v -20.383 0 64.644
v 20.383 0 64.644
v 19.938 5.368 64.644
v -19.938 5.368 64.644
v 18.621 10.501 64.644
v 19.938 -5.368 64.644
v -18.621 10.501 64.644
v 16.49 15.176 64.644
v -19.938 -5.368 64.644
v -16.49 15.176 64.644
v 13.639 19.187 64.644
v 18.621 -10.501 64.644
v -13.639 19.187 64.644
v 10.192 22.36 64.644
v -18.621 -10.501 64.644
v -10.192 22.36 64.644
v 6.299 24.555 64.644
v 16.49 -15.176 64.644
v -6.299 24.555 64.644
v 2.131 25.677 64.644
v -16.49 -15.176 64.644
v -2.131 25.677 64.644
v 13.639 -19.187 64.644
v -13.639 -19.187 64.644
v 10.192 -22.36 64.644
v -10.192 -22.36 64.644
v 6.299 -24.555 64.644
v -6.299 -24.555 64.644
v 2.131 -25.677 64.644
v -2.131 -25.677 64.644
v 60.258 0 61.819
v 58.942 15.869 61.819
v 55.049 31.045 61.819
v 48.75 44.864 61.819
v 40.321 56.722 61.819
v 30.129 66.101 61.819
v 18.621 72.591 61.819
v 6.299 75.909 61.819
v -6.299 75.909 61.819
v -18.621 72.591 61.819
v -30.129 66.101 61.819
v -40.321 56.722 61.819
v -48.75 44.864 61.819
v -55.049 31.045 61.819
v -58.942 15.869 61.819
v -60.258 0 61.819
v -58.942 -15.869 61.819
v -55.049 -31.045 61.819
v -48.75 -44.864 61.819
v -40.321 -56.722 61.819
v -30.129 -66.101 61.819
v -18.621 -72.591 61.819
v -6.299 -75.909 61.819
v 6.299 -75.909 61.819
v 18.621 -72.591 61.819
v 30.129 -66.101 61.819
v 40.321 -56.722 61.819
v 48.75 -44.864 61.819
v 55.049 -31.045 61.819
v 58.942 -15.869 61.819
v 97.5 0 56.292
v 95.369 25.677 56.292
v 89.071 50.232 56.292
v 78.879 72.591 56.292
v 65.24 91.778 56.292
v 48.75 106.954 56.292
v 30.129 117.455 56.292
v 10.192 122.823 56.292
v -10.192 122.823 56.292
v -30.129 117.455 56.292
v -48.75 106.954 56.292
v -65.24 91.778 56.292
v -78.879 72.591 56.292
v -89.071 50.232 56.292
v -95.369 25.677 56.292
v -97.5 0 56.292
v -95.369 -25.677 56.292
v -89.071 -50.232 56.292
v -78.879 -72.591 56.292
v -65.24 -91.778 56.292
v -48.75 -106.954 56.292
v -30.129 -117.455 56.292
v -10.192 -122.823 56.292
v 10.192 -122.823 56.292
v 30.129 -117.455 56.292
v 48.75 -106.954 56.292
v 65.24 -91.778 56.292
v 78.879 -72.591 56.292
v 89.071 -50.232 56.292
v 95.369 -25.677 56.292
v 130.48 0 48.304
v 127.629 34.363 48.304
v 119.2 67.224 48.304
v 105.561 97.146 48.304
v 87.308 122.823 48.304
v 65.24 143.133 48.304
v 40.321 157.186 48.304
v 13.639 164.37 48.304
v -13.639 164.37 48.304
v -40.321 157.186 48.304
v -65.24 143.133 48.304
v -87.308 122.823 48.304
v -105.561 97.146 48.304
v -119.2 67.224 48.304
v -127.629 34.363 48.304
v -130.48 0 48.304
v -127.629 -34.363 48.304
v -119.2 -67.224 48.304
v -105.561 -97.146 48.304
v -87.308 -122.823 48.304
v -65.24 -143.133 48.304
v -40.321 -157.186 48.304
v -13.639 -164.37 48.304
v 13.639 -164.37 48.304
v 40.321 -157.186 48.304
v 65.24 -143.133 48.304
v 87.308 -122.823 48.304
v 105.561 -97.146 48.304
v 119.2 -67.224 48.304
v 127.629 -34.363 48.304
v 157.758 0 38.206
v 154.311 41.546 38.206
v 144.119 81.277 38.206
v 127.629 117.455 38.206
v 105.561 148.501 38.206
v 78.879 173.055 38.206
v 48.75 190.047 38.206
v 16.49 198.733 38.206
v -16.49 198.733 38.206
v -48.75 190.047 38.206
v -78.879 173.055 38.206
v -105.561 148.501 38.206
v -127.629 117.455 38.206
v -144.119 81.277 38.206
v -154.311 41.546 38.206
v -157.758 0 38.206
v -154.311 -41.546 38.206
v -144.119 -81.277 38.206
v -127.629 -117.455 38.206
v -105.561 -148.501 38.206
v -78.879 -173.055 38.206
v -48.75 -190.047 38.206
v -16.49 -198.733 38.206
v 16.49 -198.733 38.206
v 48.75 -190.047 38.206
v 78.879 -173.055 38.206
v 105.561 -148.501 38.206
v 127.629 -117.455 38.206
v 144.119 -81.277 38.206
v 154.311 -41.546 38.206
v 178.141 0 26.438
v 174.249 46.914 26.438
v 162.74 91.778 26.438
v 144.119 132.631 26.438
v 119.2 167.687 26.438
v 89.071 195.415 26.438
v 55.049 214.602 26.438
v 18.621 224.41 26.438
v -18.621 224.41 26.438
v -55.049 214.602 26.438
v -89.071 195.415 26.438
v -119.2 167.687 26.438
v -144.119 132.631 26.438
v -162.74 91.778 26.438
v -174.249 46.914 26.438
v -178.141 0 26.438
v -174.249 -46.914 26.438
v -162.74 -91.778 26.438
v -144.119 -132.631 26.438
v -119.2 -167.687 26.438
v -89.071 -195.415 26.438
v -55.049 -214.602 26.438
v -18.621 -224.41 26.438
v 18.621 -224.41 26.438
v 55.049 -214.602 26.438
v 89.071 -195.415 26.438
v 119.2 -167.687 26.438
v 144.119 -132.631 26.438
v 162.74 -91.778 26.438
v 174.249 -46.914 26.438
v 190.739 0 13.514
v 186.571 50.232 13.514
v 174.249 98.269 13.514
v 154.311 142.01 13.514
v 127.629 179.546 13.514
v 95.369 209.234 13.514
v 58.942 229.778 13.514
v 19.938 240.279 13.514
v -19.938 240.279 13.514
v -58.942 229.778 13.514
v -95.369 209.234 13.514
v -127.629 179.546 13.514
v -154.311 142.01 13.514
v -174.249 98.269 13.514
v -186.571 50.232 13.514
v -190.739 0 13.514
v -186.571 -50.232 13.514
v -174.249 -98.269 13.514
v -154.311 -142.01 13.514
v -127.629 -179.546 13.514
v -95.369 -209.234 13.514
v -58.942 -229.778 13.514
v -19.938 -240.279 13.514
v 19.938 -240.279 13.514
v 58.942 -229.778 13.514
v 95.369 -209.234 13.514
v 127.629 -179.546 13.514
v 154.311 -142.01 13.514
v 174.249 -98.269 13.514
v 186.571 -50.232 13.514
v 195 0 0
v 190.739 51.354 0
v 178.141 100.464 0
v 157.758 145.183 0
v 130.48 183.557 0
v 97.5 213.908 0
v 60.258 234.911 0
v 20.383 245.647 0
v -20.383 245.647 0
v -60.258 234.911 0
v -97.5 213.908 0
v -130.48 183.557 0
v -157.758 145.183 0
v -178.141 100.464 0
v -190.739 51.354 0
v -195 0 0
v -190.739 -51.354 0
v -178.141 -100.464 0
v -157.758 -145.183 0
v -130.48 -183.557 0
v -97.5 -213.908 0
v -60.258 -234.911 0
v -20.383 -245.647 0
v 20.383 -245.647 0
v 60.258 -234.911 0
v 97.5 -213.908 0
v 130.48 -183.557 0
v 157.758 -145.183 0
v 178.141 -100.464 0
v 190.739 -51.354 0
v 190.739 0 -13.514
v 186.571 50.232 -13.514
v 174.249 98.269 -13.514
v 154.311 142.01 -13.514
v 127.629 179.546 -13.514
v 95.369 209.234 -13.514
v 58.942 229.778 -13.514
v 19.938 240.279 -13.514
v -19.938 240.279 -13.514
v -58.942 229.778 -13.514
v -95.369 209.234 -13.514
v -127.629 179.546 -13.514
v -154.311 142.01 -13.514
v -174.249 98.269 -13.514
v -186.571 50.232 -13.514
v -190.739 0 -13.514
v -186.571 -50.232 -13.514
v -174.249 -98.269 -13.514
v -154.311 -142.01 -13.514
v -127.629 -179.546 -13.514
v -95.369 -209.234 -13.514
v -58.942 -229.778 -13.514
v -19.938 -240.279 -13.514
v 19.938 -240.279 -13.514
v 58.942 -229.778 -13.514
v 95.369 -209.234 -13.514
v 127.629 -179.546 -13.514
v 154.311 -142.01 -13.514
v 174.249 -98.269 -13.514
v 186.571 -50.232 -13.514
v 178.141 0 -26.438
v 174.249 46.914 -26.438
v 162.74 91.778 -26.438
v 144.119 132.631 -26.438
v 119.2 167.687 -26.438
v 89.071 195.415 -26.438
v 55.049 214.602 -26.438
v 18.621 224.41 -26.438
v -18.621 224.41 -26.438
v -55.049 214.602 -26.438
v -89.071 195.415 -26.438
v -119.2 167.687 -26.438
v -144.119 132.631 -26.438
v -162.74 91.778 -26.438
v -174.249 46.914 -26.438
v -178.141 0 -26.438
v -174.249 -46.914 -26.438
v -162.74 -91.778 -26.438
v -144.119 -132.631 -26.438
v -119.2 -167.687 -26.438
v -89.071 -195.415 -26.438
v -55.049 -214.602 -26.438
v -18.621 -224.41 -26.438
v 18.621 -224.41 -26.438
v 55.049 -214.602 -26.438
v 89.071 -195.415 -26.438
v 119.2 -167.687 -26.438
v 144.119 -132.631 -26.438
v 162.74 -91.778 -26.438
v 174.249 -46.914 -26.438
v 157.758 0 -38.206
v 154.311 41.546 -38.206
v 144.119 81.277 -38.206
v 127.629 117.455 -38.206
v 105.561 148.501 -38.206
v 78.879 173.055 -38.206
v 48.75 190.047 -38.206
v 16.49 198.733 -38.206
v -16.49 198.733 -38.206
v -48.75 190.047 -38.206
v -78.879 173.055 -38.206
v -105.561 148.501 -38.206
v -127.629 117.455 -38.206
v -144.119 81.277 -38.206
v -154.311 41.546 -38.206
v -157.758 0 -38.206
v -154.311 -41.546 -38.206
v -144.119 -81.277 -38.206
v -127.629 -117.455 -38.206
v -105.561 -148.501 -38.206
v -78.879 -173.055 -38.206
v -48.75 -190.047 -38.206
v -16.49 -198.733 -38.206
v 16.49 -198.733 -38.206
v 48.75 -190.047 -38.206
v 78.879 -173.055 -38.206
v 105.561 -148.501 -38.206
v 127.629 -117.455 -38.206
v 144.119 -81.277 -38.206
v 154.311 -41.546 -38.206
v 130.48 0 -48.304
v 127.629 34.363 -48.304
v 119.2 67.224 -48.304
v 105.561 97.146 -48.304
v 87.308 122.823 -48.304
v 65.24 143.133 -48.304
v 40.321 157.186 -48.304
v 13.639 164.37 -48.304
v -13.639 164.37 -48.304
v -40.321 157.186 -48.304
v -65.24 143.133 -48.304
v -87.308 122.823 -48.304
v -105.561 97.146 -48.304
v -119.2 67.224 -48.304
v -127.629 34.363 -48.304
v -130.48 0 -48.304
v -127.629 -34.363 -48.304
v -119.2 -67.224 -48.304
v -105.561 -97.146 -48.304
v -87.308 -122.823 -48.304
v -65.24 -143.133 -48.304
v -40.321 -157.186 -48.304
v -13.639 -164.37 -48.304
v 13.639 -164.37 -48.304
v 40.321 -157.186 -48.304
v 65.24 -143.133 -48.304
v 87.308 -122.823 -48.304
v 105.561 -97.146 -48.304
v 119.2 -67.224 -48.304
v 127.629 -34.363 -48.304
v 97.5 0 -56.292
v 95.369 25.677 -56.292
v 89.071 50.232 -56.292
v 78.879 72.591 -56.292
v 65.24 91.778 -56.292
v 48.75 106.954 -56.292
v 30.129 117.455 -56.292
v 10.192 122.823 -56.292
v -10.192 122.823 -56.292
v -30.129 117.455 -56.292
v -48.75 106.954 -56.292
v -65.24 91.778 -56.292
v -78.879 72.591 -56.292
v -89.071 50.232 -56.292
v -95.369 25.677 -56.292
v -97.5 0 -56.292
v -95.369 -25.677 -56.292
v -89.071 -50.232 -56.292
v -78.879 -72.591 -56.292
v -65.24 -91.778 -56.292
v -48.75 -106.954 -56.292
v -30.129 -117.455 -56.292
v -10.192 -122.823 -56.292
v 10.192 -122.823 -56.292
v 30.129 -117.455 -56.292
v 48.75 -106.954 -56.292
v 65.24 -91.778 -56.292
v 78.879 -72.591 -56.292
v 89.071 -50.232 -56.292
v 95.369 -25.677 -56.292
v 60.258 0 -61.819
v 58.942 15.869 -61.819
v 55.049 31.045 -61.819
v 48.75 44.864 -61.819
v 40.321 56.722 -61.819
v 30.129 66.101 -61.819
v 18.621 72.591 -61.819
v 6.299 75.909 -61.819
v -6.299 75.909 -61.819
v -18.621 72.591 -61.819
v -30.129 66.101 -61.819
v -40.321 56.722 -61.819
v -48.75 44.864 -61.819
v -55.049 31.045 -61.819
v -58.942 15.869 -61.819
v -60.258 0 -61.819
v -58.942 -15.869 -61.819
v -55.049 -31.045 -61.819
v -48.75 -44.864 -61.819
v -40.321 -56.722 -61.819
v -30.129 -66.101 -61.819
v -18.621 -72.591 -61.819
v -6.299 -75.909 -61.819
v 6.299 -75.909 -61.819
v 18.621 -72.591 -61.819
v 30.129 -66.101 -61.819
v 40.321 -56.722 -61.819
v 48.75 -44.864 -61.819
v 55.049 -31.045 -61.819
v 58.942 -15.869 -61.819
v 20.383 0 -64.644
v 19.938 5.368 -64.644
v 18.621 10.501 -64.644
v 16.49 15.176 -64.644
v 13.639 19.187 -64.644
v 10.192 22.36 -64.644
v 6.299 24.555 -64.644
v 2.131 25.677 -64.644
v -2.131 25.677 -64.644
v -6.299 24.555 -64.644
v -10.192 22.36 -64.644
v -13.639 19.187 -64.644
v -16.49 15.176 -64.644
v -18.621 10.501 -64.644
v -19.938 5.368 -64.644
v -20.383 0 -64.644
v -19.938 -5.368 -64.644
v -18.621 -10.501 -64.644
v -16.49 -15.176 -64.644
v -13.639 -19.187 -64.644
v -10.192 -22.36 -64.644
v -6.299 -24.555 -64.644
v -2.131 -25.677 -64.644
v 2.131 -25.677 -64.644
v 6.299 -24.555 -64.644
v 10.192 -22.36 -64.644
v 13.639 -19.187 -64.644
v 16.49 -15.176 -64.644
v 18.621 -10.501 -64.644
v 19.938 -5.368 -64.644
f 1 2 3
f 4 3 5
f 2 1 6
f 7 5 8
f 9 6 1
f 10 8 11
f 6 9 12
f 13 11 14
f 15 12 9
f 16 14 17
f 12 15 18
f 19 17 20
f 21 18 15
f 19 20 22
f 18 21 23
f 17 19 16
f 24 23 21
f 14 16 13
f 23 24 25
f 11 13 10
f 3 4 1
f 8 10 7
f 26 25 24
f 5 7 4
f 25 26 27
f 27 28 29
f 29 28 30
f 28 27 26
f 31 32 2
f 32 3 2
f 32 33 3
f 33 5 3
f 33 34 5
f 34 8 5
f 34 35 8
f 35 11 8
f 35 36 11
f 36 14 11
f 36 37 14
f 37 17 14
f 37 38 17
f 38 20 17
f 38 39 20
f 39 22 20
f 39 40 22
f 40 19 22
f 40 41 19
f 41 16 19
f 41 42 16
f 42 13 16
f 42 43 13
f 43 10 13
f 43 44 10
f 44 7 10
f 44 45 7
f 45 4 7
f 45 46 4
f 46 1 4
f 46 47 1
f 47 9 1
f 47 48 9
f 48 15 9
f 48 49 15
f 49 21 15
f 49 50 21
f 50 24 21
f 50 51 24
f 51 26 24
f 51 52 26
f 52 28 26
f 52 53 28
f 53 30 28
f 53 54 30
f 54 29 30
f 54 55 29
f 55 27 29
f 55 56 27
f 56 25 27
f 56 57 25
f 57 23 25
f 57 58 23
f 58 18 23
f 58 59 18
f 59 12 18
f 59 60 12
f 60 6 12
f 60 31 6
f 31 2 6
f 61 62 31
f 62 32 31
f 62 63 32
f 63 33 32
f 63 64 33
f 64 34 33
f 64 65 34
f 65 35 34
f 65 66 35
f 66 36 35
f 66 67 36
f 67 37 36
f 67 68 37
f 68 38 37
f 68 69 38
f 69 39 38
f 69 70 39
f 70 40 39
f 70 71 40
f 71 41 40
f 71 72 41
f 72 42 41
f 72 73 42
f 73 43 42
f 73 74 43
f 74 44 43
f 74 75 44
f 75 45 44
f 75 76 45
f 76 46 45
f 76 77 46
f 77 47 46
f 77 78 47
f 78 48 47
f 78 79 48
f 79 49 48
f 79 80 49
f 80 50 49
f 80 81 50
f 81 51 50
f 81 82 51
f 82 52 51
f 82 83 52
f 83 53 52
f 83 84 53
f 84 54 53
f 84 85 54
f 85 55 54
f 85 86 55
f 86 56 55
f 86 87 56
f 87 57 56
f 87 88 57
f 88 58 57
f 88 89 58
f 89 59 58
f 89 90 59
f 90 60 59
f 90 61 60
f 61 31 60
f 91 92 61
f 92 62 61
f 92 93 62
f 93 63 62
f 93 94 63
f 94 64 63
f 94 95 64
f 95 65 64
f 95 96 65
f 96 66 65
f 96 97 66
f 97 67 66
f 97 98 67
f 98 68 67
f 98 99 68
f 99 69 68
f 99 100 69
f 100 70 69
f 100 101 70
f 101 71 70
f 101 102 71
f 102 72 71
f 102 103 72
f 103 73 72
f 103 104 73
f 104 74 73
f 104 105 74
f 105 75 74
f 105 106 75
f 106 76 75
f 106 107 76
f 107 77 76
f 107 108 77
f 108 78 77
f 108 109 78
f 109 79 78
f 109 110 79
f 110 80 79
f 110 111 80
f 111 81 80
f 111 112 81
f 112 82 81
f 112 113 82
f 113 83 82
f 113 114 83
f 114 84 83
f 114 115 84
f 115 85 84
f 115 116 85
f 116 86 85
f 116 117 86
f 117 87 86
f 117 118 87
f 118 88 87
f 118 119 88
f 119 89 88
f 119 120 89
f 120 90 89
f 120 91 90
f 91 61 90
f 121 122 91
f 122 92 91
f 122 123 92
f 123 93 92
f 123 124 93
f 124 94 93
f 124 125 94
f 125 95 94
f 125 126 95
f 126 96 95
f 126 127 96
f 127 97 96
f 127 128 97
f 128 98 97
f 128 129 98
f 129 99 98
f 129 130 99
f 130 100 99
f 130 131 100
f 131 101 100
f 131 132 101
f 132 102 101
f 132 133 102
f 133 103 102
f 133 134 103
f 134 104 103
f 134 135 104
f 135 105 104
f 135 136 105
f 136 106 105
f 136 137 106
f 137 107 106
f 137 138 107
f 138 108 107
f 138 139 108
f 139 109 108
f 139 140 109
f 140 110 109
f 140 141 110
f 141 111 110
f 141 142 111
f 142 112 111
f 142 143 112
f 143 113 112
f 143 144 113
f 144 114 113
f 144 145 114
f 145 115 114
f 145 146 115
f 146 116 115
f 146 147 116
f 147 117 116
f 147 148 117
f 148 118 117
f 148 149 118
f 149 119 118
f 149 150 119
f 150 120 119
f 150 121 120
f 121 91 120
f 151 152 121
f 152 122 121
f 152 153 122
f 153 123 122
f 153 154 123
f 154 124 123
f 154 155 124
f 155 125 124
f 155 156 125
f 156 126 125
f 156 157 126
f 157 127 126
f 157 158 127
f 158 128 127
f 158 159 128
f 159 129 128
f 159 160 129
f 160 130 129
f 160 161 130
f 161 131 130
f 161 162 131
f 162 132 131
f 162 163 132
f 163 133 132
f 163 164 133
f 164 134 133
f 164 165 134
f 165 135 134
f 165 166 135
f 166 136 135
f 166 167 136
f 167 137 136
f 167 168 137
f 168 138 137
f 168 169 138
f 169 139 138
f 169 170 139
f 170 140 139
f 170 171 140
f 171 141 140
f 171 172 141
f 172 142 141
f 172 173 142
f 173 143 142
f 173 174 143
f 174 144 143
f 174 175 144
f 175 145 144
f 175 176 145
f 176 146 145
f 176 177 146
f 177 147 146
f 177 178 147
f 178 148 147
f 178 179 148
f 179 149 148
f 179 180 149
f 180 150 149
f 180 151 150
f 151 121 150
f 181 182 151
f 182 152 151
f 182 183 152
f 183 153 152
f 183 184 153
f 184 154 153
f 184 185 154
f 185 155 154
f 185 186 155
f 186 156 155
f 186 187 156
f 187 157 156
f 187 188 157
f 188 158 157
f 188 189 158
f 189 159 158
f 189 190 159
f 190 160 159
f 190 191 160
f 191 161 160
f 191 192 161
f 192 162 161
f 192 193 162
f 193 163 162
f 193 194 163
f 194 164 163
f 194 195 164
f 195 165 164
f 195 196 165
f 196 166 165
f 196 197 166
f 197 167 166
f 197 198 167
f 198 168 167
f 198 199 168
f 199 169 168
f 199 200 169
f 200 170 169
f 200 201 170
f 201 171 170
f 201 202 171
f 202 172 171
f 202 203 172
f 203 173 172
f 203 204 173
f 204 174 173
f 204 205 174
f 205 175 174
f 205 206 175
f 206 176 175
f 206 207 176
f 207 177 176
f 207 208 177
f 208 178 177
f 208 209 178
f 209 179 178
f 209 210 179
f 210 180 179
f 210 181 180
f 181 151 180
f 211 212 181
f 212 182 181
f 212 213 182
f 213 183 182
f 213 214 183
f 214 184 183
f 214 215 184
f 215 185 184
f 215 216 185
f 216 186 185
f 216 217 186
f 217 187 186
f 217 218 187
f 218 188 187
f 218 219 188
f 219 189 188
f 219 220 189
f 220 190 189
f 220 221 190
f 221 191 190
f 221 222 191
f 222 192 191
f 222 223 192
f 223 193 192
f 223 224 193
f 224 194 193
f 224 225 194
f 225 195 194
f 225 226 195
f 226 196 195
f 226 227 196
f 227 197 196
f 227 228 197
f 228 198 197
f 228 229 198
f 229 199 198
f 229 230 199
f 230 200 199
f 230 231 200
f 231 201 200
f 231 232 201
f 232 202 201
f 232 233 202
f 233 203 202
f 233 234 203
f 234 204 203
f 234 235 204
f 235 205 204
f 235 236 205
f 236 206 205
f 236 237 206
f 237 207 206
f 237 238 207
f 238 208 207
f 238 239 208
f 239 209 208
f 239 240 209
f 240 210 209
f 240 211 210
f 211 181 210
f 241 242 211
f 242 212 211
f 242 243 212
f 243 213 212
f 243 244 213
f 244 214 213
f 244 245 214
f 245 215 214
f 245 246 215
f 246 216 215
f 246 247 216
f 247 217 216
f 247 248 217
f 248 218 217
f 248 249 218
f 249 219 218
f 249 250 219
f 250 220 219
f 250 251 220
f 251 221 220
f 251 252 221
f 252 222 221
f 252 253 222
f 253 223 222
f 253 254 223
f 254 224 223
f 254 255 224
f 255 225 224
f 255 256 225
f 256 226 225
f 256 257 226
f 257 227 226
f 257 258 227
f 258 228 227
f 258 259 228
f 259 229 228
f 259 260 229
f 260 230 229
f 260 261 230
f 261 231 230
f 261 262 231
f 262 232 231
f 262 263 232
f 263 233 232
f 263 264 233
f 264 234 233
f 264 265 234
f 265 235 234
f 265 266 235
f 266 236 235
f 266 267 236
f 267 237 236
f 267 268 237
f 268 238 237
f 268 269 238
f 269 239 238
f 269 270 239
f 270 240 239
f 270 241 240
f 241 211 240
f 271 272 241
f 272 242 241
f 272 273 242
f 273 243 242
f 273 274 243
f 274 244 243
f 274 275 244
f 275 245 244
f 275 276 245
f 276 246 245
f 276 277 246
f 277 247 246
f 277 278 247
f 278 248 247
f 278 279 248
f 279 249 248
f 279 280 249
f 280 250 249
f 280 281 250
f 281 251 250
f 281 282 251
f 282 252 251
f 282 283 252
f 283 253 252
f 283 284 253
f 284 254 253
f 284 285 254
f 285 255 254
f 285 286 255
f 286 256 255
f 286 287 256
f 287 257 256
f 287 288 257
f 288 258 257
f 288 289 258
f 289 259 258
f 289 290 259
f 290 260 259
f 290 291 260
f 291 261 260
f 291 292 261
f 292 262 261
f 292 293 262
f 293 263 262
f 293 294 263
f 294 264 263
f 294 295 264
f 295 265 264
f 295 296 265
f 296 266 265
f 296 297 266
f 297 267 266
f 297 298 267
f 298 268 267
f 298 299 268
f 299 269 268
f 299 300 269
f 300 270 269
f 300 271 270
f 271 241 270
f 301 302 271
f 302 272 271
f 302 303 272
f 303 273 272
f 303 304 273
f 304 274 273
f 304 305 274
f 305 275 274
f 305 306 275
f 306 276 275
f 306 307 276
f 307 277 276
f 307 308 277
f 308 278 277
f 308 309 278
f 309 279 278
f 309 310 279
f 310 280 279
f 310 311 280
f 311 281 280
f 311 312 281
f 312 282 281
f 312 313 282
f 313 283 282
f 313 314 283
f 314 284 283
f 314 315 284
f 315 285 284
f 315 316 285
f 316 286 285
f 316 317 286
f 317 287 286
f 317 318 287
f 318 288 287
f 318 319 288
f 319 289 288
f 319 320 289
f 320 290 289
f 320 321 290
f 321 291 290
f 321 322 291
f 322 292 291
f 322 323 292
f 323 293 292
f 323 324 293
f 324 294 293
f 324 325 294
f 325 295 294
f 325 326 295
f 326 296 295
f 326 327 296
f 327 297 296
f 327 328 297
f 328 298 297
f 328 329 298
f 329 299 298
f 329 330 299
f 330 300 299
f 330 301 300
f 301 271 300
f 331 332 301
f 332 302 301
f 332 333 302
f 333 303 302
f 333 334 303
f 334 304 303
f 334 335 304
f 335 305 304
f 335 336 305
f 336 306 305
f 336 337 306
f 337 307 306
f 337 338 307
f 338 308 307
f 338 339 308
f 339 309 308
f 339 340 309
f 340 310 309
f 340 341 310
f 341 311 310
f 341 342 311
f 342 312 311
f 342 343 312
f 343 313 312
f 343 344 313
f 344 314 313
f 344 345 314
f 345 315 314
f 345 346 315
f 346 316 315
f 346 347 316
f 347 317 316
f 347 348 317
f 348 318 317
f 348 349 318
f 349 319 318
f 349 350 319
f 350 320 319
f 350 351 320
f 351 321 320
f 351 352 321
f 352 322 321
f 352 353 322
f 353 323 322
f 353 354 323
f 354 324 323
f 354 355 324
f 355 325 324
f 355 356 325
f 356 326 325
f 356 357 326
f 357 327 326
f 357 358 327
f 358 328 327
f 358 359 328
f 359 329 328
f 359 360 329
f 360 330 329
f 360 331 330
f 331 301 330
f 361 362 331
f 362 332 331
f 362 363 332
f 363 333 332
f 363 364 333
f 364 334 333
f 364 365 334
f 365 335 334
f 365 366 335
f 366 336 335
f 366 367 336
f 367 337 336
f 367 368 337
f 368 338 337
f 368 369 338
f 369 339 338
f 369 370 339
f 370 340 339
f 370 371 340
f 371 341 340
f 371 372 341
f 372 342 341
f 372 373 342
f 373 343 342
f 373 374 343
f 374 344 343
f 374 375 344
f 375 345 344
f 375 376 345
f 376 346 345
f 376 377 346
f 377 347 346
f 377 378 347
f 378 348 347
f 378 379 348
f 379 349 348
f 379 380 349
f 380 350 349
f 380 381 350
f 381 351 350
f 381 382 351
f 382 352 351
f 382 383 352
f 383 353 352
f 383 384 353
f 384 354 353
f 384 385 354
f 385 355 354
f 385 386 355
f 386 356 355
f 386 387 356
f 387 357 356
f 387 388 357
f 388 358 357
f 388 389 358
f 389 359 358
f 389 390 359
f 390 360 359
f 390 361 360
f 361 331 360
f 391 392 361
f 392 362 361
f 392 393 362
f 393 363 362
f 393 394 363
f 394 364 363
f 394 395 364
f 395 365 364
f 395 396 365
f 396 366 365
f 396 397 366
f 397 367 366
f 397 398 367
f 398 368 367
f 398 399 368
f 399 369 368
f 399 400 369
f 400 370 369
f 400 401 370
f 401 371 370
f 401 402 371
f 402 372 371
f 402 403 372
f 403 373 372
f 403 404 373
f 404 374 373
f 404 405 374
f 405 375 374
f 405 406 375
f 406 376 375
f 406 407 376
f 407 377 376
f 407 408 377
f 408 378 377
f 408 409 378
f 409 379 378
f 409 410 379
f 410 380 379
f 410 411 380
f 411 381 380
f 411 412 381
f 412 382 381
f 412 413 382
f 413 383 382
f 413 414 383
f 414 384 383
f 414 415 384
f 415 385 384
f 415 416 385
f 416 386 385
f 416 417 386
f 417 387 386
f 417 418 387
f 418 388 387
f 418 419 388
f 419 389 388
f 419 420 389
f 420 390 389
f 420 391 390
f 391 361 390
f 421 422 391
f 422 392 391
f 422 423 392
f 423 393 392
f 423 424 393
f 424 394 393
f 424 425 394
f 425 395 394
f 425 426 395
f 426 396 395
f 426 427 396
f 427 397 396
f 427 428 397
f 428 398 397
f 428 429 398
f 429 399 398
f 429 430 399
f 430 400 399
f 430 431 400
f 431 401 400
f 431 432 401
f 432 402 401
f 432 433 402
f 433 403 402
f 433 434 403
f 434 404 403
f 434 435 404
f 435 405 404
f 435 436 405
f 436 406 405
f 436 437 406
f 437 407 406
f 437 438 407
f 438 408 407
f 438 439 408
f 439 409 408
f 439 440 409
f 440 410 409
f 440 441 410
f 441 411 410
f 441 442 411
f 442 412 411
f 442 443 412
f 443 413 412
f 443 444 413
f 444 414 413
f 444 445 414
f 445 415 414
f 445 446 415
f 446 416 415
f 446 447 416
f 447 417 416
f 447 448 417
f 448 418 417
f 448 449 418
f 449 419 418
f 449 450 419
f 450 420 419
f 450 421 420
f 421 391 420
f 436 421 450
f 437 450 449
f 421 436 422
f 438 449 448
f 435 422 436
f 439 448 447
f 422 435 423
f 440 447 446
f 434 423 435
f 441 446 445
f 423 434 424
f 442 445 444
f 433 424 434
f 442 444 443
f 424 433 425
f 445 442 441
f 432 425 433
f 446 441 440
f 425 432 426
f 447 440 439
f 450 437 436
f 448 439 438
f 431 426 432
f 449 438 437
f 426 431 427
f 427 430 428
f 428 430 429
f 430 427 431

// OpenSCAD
// Generated by SolidPython 1.0.1 on 2020-07-29 00:46:52


scale(v = [15, 19, 5]) {
	sphere(r = 13);
}
/***********************************************
*********      SolidPython code:      **********
************************************************
 
# import packages: SolidPython
from solid import *
from solid.utils import *
from itertools import chain, combinations, permutations


class Resize:

    def __init__(self, scad_file):
        self.scad_file = scad_file
        #self.scad_file = import_scad(scad_file)
        # cone/cylinder param:
        self.r1 = 0
        self.r2 = 0
        self.h = 0
        # rectangular prism param:
        self.w = 0
        self.l = 0
        # ellipse param:
        self.r = 0

    # import OpenScad code (file name corresponds to shape)


    # classify shape + parameters
    def assign(self, param1, param2, param3):
        if self.scad_file == 'cone.scad':
            self.r1 = param1
            self.r2 = param2
            self.h = param3
        elif self.scad_file == 'cylinder.scad':
            self.r1 = param1
            self.r2 = param2
            self.h = param3
        elif self.scad_file == 'rectangularPrism.scad':
            self.h = param1
            self.l = param2
            self.w = param3
        else:
            self.r = param1
            self.h = param2

    # resize parameters
    def iterate(self):
        x = range(3, 20, 2)
        i = 1
        if self.scad_file == 'cone.scad':
            tempList = list(permutations(x, 2))
            for temp in tempList:
                param1 = temp[0]
                param2 = temp[1]
                filepath = 'produced_scad_files/' + 'cone' + str(param1) + '_' + str(param2) + '_' + '.scad'
                scad_render_to_file(cylinder(h=param1, r1=param2, r2=0), filepath)

        elif self.scad_file == 'cylinder.scad':
            tempList = list(permutations(x, 3))
            for temp in tempList:
                param1 = temp[0]
                param2 = temp[1]
                filepath = 'produced_scad_files/' + 'cylinder' + str(param1) + '_' + str(param2) + '_' + '.scad'
                scad_render_to_file(cylinder(h=param1, r1=param2, r2=param2), filepath)

        elif self.scad_file == 'rectangularPrism.scad':
            tempList = list(permutations(x, 3))
            for temp in tempList:
                param1 = temp[0]
                param2 = temp[1]
                param3 = temp[2]
                filepath = 'produced_scad_files/' + 'rectangularPrism' + str(param1) + '_' + str(param2) + '_' + str(
                    param3) + '.scad'
                scad_render_to_file(cube(size=(param1, param2, param3)), filepath)

        elif self.scad_file == 'ellipse.scad':
            tempList = list(permutations(x, 4))
            for temp in tempList:
                param1 = temp[0]
                param2 = temp[1]
                param3 = temp[2]
                param4 = temp[3]
                filepath = 'produced_scad_files/' + 'ellipse' + str(param1) + '_' + str(param2) + '_' + str(param3) + '_' + str(param4) + '.scad'
                scad_render_to_file(scale([param1, param2, param3])(sphere(r=param4)), filepath)

    def render_to_scadfile(self):
        scad_render_to_file(scad, 'example.scad') 
 
************************************************/
